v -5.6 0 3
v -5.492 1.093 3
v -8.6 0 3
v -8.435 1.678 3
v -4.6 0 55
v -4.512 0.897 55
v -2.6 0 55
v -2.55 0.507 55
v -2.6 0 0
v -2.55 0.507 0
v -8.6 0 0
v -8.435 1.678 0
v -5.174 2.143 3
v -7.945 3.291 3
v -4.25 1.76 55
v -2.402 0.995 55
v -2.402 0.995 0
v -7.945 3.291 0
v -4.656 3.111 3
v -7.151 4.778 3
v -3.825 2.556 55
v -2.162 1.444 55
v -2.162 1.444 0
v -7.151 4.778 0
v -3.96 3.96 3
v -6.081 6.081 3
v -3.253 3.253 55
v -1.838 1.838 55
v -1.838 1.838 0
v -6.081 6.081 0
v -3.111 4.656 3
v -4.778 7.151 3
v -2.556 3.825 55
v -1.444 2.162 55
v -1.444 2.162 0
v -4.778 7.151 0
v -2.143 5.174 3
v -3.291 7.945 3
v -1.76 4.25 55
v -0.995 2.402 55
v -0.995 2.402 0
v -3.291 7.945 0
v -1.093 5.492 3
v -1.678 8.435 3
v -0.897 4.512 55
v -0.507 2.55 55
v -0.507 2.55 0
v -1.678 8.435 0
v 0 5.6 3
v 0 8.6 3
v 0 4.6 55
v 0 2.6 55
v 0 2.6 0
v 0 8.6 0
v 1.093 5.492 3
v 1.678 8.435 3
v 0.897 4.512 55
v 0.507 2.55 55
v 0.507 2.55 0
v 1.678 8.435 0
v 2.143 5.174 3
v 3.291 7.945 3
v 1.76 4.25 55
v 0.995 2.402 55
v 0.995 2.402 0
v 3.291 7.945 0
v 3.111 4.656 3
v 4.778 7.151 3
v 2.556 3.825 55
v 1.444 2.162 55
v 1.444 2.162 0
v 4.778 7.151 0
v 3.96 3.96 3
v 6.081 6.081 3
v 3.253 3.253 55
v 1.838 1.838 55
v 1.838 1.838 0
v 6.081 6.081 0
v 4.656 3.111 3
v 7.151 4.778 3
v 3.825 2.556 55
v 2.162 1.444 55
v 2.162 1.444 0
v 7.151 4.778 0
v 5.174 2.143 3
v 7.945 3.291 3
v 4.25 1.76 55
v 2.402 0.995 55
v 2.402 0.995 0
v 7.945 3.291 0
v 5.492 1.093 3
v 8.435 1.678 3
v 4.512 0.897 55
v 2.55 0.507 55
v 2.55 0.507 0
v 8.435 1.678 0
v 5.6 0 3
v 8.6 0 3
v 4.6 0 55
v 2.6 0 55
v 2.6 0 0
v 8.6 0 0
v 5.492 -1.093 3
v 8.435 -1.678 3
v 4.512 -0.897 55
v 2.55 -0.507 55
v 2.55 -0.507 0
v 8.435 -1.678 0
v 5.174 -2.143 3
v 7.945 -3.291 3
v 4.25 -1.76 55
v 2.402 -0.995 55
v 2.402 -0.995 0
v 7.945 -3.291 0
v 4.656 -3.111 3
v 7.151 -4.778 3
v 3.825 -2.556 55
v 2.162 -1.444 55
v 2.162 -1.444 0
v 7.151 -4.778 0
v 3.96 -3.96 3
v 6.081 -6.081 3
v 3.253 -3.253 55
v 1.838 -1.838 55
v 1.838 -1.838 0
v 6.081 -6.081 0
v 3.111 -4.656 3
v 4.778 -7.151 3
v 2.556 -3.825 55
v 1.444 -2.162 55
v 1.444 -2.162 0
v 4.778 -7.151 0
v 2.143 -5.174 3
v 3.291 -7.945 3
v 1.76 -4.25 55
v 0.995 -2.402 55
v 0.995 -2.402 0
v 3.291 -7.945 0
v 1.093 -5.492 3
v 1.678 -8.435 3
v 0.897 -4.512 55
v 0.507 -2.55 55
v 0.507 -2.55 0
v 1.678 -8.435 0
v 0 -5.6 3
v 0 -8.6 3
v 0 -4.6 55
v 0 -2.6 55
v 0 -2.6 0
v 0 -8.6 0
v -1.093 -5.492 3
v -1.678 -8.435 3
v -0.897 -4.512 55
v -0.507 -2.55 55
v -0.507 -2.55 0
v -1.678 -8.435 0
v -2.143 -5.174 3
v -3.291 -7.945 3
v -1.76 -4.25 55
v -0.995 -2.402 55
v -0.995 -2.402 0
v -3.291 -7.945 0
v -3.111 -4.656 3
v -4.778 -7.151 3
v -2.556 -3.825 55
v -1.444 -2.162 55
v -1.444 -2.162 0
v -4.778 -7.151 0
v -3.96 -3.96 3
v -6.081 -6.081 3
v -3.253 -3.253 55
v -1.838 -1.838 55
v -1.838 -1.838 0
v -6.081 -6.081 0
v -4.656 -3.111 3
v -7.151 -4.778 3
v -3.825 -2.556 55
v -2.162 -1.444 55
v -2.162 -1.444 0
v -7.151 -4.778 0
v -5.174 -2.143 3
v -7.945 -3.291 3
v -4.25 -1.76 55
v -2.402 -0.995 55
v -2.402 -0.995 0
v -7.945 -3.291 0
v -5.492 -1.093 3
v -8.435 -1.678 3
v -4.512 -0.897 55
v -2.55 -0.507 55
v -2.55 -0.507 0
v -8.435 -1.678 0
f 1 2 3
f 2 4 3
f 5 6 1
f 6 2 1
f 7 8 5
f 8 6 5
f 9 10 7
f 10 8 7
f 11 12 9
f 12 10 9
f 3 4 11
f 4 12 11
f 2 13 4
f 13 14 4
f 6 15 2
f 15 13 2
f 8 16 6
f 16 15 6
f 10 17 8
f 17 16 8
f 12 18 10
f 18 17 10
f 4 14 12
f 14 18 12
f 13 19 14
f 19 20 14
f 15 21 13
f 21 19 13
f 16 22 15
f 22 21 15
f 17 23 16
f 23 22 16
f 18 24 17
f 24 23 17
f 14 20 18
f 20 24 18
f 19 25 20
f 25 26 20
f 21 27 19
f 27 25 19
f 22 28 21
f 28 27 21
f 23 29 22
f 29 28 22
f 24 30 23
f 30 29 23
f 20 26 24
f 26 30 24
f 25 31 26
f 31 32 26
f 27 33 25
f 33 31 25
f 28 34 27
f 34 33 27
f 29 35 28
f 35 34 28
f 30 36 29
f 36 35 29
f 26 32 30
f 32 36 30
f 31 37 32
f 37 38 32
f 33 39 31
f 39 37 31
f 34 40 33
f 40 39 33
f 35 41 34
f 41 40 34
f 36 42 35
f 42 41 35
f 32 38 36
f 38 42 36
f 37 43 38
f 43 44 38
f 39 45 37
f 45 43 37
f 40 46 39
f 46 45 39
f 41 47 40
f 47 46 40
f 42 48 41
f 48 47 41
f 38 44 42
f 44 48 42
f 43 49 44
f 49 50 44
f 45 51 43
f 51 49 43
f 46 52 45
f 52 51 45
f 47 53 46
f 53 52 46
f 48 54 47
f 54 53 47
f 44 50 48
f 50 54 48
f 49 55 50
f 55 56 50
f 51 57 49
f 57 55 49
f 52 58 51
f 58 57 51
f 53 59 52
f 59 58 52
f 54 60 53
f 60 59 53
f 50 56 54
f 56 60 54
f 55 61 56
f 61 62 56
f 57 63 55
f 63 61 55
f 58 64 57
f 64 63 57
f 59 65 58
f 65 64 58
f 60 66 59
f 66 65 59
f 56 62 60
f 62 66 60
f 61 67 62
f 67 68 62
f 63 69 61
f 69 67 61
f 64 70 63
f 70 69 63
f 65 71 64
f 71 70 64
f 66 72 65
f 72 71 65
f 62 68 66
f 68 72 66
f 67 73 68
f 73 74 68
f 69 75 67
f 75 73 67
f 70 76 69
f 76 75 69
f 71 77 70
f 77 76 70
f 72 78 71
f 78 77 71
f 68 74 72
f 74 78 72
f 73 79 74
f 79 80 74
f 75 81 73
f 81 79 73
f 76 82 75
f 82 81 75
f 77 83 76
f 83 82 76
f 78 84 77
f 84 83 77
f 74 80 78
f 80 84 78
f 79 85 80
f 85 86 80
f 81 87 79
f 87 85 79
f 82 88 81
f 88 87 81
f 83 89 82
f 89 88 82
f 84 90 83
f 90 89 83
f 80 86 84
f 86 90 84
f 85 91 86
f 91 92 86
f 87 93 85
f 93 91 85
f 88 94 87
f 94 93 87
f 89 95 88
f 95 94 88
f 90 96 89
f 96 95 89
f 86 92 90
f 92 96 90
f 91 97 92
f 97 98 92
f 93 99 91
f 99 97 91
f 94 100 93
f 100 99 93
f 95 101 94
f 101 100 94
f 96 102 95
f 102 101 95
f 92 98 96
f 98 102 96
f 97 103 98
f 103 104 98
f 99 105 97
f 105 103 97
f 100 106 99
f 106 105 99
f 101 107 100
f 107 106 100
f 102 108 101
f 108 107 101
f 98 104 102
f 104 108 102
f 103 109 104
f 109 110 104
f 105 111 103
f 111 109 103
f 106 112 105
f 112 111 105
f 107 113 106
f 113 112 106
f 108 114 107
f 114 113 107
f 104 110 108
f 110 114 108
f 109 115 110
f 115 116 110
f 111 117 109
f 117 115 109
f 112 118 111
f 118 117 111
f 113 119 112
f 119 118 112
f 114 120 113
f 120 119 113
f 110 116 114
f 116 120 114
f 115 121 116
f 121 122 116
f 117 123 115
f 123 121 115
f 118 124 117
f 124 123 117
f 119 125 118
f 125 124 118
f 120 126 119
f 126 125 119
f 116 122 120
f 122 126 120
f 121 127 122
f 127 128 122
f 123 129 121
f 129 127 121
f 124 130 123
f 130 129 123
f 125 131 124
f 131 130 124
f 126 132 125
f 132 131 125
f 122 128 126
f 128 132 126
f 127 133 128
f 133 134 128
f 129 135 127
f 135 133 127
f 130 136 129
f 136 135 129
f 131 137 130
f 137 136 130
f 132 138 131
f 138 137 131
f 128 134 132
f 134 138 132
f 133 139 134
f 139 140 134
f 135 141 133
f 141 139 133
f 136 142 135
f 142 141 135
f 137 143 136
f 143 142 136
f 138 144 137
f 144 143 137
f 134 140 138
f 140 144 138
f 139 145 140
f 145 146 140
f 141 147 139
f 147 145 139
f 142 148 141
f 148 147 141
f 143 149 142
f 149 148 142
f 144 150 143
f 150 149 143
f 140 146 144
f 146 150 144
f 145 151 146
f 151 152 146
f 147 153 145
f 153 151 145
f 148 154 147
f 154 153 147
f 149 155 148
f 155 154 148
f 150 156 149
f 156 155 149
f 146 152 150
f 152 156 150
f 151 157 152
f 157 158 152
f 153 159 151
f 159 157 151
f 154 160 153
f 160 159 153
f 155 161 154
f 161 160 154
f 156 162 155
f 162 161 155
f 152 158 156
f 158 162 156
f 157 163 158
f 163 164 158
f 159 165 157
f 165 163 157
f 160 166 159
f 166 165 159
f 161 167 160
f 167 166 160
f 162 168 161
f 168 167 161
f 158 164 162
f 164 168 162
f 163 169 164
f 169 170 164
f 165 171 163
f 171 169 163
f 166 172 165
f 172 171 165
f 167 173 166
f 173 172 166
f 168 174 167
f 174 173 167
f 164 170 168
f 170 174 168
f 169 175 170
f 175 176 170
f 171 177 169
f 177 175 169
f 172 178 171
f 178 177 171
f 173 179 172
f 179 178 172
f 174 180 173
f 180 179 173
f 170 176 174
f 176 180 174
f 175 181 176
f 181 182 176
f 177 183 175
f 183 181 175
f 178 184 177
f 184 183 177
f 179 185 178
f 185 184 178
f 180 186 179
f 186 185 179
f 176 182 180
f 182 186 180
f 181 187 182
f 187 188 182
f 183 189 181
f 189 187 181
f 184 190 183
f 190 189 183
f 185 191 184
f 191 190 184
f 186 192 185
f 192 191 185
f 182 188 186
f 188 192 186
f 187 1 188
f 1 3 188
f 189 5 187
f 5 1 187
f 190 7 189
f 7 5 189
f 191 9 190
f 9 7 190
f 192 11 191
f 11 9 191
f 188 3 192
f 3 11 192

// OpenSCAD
$fn = 32;

// ----------------------------------------------------------------------
// Profiled standoff: conical spacer, 55 mm long, bore 5.2 mm
// ----------------------------------------------------------------------

// --- parameters (mm) ---
revolve_angle = 360;      // full turn around the Z axis
profile_points = 6;       // points of the closed outline

profile = [[2.6, 0], [8.6, 0], [8.6, 3], [5.6, 3], [4.6, 55], [2.6, 55]];  // single closed polygon, 6 points, counter clockwise

// --- the one profile operation ---
rotate_extrude(angle = revolve_angle) polygon(points = profile);
